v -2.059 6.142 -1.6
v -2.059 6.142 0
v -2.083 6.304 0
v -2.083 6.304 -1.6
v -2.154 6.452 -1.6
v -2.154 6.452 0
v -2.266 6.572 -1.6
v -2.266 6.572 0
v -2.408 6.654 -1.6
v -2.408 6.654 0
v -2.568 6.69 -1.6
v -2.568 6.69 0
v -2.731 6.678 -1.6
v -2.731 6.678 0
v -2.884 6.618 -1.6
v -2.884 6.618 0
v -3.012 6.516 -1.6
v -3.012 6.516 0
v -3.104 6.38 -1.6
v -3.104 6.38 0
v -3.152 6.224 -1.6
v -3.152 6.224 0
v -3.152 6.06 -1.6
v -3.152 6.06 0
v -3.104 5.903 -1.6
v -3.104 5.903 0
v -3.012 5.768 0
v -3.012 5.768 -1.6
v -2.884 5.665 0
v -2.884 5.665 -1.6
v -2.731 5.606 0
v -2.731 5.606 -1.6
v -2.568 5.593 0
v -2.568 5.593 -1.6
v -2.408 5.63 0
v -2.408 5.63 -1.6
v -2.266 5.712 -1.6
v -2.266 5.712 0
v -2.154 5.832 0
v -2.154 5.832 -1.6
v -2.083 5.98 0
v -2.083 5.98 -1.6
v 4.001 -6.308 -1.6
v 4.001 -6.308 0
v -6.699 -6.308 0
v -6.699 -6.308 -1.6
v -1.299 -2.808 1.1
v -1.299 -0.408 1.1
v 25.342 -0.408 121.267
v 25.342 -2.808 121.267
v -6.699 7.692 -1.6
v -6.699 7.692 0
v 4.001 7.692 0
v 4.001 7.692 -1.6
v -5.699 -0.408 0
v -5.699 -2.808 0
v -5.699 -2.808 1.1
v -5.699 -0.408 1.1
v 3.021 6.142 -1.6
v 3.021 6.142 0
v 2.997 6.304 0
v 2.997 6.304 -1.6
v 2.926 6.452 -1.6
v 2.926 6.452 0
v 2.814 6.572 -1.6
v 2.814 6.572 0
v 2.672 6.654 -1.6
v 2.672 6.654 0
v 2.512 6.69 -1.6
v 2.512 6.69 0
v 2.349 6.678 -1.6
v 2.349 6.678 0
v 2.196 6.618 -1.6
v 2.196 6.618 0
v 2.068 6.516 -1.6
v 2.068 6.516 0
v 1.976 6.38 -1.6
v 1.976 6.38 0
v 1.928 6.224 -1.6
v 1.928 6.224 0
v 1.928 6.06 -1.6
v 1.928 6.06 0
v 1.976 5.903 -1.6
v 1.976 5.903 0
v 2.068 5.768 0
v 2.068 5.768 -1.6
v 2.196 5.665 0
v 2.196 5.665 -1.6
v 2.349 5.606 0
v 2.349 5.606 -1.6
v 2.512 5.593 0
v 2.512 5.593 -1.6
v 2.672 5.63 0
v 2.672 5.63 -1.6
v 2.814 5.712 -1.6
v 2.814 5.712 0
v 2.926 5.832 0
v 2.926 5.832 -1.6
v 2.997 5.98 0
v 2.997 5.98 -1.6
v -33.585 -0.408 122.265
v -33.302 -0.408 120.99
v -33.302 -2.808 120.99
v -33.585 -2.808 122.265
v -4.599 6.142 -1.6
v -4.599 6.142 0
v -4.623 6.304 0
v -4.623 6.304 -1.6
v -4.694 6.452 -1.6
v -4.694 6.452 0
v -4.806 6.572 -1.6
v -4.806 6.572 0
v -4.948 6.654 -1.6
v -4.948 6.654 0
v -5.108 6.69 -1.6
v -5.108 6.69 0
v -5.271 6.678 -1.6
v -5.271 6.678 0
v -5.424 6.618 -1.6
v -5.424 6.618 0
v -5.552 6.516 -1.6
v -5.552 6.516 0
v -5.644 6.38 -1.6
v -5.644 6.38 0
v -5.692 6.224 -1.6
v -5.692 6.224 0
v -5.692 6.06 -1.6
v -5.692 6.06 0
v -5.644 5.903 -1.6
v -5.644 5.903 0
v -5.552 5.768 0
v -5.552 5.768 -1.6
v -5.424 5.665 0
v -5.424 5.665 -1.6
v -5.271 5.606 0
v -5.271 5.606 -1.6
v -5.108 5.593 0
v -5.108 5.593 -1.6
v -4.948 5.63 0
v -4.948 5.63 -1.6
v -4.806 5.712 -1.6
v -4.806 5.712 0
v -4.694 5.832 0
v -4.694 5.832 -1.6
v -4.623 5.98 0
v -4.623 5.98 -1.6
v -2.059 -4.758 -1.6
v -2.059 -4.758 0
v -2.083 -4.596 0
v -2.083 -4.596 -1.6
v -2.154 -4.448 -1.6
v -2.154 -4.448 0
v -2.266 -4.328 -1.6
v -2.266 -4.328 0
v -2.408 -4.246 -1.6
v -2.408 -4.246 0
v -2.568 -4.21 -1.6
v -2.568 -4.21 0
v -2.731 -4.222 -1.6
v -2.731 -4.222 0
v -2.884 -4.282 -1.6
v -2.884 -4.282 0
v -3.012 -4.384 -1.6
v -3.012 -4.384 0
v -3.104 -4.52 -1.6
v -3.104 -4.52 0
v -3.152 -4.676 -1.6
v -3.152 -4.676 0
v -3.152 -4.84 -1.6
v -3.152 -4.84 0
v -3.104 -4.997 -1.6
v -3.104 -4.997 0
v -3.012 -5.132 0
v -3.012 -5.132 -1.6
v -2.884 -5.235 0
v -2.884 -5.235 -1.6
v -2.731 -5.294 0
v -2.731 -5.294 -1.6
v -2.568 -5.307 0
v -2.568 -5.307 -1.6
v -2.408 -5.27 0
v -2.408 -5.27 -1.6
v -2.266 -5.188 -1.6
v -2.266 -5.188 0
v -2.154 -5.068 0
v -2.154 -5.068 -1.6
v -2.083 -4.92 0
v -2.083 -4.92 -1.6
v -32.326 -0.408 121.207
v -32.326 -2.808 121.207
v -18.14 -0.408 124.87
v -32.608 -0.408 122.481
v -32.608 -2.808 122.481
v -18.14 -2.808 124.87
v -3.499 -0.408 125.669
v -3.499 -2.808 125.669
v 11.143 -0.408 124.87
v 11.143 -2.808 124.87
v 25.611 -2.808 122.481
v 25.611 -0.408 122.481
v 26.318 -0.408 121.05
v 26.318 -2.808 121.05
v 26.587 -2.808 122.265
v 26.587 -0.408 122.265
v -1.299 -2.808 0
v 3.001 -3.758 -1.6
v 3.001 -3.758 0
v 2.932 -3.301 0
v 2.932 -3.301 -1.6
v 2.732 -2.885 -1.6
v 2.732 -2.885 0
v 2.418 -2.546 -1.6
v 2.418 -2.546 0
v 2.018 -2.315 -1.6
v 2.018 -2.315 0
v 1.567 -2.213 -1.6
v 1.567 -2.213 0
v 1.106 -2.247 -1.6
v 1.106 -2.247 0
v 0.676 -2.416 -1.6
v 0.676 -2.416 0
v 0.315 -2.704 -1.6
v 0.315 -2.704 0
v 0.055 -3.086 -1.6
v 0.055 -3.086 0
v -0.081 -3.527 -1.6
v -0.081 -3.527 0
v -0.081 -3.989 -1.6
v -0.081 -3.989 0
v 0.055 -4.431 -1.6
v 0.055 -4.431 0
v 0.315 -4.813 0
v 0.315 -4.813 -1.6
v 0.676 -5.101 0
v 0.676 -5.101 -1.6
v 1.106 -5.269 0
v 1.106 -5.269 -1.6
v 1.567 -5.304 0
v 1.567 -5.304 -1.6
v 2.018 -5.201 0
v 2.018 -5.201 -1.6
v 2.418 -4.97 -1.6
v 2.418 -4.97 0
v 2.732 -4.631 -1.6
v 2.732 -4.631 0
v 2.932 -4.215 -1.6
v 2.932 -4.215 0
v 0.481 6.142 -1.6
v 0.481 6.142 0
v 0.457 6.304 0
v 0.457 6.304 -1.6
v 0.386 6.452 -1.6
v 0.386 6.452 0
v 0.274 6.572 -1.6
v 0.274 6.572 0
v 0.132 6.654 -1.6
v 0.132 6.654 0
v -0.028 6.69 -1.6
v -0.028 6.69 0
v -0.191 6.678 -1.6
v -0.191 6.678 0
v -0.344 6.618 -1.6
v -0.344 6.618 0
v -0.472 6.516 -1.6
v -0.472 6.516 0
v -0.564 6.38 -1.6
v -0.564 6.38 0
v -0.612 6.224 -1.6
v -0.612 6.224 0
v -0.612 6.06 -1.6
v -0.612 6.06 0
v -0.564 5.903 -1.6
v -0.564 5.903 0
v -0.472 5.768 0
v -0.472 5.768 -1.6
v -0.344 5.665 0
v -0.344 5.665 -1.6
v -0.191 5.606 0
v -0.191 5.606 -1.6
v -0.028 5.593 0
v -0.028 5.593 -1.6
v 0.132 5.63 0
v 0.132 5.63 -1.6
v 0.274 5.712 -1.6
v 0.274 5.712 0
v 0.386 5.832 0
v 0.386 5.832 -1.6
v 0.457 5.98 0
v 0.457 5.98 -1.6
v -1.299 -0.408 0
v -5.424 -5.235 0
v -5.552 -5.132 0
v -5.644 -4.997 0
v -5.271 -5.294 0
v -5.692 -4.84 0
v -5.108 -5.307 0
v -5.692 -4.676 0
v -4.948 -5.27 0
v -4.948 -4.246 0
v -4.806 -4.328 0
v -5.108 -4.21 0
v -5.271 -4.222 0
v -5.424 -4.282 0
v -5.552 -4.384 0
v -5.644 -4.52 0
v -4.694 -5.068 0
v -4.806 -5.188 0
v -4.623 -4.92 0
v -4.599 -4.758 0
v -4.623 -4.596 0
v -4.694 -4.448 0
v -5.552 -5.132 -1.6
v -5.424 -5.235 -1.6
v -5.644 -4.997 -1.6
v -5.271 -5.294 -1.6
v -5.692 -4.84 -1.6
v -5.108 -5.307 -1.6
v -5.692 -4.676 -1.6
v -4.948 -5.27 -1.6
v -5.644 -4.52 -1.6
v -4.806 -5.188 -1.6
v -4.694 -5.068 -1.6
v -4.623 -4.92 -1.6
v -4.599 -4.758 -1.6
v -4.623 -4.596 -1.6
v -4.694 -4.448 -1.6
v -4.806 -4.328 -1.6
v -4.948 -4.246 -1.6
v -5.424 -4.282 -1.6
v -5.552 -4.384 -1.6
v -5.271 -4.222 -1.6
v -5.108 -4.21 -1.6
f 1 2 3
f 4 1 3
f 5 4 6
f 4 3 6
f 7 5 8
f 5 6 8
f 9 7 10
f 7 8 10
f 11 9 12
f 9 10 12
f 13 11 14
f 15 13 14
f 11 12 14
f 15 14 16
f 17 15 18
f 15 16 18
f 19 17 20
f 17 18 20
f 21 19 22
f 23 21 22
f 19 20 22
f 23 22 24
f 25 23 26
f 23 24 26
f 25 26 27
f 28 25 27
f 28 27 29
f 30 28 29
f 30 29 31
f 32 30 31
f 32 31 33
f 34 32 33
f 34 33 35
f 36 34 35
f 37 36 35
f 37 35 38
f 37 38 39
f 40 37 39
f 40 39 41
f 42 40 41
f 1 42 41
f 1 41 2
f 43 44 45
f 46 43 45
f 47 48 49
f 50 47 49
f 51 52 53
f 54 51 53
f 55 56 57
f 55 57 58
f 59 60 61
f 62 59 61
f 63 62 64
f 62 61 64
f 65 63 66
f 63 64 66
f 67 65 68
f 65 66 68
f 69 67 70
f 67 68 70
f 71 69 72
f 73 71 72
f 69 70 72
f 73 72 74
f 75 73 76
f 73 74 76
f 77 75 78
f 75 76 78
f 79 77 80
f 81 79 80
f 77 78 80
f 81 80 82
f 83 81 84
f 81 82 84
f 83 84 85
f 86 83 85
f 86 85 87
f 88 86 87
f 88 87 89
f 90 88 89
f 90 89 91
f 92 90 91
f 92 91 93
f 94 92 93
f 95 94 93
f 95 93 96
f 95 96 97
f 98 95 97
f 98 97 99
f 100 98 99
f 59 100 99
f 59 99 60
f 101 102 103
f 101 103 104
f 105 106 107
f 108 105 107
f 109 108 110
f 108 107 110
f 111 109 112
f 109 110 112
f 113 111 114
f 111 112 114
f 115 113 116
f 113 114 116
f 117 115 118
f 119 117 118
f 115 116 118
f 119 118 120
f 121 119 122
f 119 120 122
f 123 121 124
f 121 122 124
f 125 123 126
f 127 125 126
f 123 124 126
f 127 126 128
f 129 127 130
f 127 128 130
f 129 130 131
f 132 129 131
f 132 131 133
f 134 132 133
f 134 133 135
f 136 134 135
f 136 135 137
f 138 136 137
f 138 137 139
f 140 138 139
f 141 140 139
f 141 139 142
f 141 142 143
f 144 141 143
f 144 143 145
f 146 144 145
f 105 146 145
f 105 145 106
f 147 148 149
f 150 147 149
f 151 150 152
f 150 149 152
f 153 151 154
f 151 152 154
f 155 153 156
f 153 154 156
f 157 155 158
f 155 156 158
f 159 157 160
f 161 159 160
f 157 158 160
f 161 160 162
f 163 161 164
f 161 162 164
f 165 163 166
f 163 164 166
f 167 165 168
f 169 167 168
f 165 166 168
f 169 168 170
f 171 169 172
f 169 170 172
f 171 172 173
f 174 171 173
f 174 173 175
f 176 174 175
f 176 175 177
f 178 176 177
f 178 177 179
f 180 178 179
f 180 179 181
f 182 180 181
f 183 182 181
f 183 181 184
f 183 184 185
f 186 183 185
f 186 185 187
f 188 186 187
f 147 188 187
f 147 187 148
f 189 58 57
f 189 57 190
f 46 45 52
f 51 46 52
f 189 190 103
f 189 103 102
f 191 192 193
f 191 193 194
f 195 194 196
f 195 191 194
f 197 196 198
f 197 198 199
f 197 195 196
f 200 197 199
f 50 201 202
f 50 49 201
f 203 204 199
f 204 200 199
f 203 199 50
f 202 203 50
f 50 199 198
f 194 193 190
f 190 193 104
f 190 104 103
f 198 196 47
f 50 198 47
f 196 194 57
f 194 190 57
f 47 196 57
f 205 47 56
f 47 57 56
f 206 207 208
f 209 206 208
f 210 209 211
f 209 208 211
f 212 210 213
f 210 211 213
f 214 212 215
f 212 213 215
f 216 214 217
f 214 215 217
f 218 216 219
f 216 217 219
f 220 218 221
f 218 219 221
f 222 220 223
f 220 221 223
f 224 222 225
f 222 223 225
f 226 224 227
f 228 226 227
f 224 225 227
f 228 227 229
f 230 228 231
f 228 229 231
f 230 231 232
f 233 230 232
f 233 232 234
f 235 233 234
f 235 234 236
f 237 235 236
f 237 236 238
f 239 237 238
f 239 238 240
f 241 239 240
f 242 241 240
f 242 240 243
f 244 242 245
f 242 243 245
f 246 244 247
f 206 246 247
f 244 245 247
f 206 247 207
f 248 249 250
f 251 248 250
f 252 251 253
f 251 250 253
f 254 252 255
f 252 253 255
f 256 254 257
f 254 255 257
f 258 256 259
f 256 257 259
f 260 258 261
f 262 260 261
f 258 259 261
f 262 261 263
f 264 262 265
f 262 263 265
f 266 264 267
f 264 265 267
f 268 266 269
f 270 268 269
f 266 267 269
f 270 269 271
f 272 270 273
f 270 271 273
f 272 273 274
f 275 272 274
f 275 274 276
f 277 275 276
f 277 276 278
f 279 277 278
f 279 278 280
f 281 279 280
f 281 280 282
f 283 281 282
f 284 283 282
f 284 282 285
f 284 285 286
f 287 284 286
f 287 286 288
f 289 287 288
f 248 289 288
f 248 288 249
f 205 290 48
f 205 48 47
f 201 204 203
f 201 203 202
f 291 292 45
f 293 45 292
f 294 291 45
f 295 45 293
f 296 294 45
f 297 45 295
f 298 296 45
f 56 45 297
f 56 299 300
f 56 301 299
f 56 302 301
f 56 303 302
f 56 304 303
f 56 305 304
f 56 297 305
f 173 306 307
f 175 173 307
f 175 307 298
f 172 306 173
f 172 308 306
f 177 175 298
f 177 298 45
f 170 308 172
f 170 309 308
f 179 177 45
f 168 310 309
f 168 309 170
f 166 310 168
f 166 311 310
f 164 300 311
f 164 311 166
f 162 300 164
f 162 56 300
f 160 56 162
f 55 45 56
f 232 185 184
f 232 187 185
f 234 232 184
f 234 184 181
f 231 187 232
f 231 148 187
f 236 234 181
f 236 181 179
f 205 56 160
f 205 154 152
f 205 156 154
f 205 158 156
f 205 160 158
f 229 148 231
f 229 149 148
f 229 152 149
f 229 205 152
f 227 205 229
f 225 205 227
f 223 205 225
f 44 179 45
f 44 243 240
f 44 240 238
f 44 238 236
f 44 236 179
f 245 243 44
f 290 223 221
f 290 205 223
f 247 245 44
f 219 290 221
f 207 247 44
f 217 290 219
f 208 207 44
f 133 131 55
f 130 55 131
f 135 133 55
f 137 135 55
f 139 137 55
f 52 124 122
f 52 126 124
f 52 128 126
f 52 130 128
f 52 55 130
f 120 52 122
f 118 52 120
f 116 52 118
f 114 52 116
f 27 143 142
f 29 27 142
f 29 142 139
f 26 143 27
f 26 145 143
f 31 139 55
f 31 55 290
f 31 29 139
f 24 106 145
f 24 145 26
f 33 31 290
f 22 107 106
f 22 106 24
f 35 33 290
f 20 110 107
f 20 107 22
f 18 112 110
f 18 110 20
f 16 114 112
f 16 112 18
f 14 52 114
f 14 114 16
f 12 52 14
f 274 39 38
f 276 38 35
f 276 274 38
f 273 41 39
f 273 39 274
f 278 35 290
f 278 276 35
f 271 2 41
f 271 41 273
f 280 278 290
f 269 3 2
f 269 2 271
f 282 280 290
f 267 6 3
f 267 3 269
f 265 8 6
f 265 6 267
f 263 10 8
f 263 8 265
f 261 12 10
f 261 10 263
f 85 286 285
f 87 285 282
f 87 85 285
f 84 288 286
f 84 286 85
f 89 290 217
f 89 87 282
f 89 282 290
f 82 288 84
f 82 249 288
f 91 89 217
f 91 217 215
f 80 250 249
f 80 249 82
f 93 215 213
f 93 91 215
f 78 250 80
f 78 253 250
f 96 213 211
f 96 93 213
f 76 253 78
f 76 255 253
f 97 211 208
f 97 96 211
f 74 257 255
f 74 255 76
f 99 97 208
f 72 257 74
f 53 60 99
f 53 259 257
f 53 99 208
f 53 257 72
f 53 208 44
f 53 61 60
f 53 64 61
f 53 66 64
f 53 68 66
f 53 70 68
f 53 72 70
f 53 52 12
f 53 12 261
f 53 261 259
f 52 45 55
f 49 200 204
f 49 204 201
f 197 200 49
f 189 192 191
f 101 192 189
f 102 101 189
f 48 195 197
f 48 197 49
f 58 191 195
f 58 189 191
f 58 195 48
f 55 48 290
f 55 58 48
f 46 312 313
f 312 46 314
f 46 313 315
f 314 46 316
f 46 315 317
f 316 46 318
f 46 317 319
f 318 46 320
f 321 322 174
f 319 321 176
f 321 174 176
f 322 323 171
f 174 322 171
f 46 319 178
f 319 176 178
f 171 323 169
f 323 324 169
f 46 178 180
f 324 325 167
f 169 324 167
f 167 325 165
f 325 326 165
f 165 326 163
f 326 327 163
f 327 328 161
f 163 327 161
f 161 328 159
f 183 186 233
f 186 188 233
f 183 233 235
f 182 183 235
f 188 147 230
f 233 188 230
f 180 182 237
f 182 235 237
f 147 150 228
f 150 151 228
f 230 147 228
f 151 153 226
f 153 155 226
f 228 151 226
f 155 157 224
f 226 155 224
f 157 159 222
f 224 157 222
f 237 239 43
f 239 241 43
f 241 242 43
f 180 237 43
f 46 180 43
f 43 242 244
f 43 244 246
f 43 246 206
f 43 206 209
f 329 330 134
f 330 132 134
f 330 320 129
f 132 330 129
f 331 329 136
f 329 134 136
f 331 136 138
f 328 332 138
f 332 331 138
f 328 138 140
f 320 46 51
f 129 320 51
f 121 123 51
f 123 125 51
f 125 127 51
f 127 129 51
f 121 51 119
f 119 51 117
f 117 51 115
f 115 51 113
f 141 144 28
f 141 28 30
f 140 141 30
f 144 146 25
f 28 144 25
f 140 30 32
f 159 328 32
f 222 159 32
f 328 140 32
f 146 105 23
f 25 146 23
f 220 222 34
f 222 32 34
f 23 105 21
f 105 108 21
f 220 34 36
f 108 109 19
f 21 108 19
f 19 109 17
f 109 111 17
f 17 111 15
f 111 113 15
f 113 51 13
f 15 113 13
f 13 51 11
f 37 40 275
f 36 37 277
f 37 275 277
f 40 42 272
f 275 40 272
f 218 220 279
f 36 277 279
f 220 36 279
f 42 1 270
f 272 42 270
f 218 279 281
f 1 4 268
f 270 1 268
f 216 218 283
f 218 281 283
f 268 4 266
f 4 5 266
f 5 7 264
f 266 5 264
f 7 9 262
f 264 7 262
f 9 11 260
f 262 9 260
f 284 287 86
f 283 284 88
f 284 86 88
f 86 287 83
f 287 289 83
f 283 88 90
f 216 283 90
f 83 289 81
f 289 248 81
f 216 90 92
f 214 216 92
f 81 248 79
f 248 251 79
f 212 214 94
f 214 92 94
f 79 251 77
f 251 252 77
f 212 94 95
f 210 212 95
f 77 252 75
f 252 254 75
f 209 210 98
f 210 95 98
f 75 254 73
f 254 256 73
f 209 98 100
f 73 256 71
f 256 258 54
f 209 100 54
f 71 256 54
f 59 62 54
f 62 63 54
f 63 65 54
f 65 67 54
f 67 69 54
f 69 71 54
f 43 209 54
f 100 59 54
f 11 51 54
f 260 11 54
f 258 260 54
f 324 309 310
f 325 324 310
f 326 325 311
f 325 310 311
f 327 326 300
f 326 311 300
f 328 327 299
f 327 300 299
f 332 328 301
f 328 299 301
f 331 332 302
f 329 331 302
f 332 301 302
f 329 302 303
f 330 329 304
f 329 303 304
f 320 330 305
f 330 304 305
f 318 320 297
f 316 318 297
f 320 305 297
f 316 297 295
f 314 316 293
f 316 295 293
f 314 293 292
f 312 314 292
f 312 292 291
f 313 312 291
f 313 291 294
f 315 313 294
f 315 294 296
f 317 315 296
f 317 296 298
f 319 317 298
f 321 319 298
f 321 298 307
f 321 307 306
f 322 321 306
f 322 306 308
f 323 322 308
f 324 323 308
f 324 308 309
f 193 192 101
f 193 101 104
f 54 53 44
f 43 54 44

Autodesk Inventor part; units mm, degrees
ref_plane "YZ Plane" through (0, 0, 0) normal (1, 0, 0) x (0, 1, 0)
ref_plane "XZ Plane" through (0, 0, 0) normal (0, 1, 0) x (-1, 0, 0)
ref_plane "XY Plane" through (0, 0, 0) normal (0, 0, 1) x (1, 0, 0)
sketch "Sketch1" plane through (0, 0, 0) normal (0, 0, 1) x (1, 0, 0)
  line L0 (-6.698639, 7.691729) -> (4.001361, 7.691729)
  line L1 (4.001361, 7.691729) -> (4.001361, -6.308271)
  line L2 (4.001361, -6.308271) -> (-6.698639, -6.308271)
  line L3 (-6.698639, -6.308271) -> (-6.698639, 7.691729)
  line L4 (4.001361, -6.308271) -> (-6.698639, -6.308271)
  line L5 (-6.698639, -6.308271) -> (-6.698639, -2.808271)
  line L6 (-6.698639, -2.808271) -> (4.001361, -2.808271)
  line L7 (4.001361, -2.808271) -> (4.001361, -6.308271)
  line L8 (-6.698639, -6.308271) -> (-5.698639, -6.308271)
  line L9 (-5.698639, -6.308271) -> (-5.698639, 7.691729)
  line L10 (-5.698639, 7.691729) -> (-6.698639, 7.691729)
  line L11 (-6.698639, 7.691729) -> (-6.698639, -6.308271)
  line L12 (-5.698639, -2.808271) -> (3.472299, -2.808271)
  line L13 (3.472299, -2.808271) -> (3.472299, -0.408271)
  line L14 (3.472299, -0.408271) -> (-5.698639, -0.408271)
  line L15 (-5.698639, -0.408271) -> (-5.698639, -2.808271)
  line L16 (-5.698639, -0.408271) -> (-1.298639, -0.408271)
  line L17 (-1.298639, -0.408271) -> (-1.298639, -2.808271)
  line L18 (-1.298639, -2.808271) -> (-5.698639, -2.808271)
  line L19 (-5.698639, -2.808271) -> (-5.698639, -0.408271)
  point P0 (0, 0)
  dimension "d0" = 10.7
  dimension "d1" = 14
  dimension "d2" = 3.5
  dimension "d3" = 1
  dimension "d4" = 2.4
  dimension "d5" = 4.4
extrude "Extrusion1" add sketch "Sketch1" against normal blind 1.6
extrude "Extrusion2" add sketch "Sketch1" along normal blind 1.1 contours L14 L17 L6 L9
sketch "Sketch2" plane through (0, 0, 0) normal (0, 0, 1) x (1, 0, 0)
  line L0 (-1.298639, -0.408271) -> (-1.298639, -2.808271)
  line L1 (-1.298639, -2.808271) -> (-5.698639, -2.808271)
  line L2 (-5.698639, -2.808271) -> (-5.698639, -0.408271)
  line L3 (-5.698639, -0.408271) -> (-1.298639, -0.408271)
  line L4 (4.001361, 7.691729) -> (-6.698639, 7.691729)
  line L5 (-6.698639, 7.691729) -> (-6.698639, -6.308271)
  line L6 (-6.698639, -6.308271) -> (4.001361, -6.308271)
  line L7 (4.001361, -6.308271) -> (4.001361, 7.691729)
  line L8 (4.001361, -6.308271) -> (4.001361, 7.691729)
  line L9 (-6.698639, 7.691729) -> (-6.698639, -6.308271)
  line L10 (4.001361, -6.308271) -> (-6.698639, -6.308271)
  line L11 (-6.698639, -6.308271) -> (-6.698639, -5.308271)
  line L12 (-6.698639, -5.308271) -> (4.001361, -5.308271)
  line L13 (4.001361, -5.308271) -> (4.001361, -6.308271)
  line L14 (4.001361, -6.308271) -> (3.001361, -6.308271)
  line L15 (3.001361, -6.308271) -> (3.001361, -2.808271)
  line L16 (3.001361, -2.808271) -> (4.001361, -2.808271)
  line L17 (4.001361, -2.808271) -> (4.001361, -6.308271)
  line L18 (-6.698639, -6.308271) -> (-0.098639, -6.308271)
  line L19 (-0.098639, -6.308271) -> (-0.098639, -2.808271)
  line L20 (-0.098639, -2.808271) -> (-6.698639, -2.808271)
  line L21 (-6.698639, -2.808271) -> (-6.698639, -6.308271)
  circle A0 centre (1.451361, -3.758271) radius 1.55
  point P0 (0, 0)
  dimension "d10" = 1
  dimension "d11" = 1
  dimension "d12" = 6.6
extrude "Extrusion3" cut sketch "Sketch2" against normal through all contours A0
sketch "Sketch3" plane through (0, 0, 0) normal (0, 0, 1) x (1, 0, 0)
  line L0 (4.001361, 7.691729) -> (4.001361, -6.308271)
  line L1 (-6.698639, 7.691729) -> (4.001361, 7.691729)
  line L2 (4.001361, 7.691729) -> (4.001361, 6.691729)
  line L3 (4.001361, 6.691729) -> (-6.698639, 6.691729)
  line L4 (-6.698639, 6.691729) -> (-6.698639, 7.691729)
  line L5 (-6.698639, 7.691729) -> (-5.698639, 7.691729)
  line L6 (-5.698639, 7.691729) -> (-5.698639, 5.612457)
  line L7 (-5.698639, 5.612457) -> (-6.698639, 5.612457)
  line L8 (-6.698639, 5.612457) -> (-6.698639, 7.691729)
  line L9 (-5.698639, 6.691729) -> (-4.598639, 6.691729)
  line L10 (-4.598639, 6.691729) -> (-4.598639, 6.161753)
  line L11 (-4.598639, 6.161753) -> (-5.698639, 6.161753)
  line L12 (-5.698639, 6.161753) -> (-5.698639, 6.691729)
  circle A0 centre (-5.148639, 6.141729) radius 0.55
  circle A1 centre (-2.608639, 6.141729) radius 0.55
  line L13 (-2.058639, 6.161753) -> (-3.158639, 6.161753)
  circle A2 centre (-0.068639, 6.141729) radius 0.55
  line L14 (0.481361, 6.161753) -> (-0.618639, 6.161753)
  circle A3 centre (2.471361, 6.141729) radius 0.55
  line L15 (3.021361, 6.161753) -> (1.921361, 6.161753)
  circle A4 centre (1.451361, -3.758271) radius 1.55
  line L16 (-1.298639, -0.408271) -> (-1.298639, -2.808271)
  line L17 (-1.298639, -2.808271) -> (-5.698639, -2.808271)
  line L18 (-5.698639, -2.808271) -> (-5.698639, -0.408271)
  line L19 (-5.698639, -0.408271) -> (-1.298639, -0.408271)
  line L20 (4.001361, 7.691729) -> (-6.698639, 7.691729)
  line L21 (-6.698639, 7.691729) -> (-6.698639, -6.308271)
  line L22 (-6.698639, -6.308271) -> (4.001361, -6.308271)
  line L23 (4.001361, -6.308271) -> (4.001361, 7.691729)
  line L24 (-6.698639, -6.308271) -> (-5.698639, -6.308271)
  line L25 (-5.698639, -6.308271) -> (-5.698639, -3.371834)
  line L26 (-5.698639, -3.371834) -> (-6.698639, -3.371834)
  line L27 (-6.698639, -3.371834) -> (-6.698639, -6.308271)
  line L28 (-6.698639, -6.308271) -> (4.001361, -6.308271)
  line L29 (-6.698639, -6.308271) -> (-3.498639, -6.308271)
  line L30 (-3.498639, -6.308271) -> (-3.498639, -5.308271)
  line L31 (-3.498639, -5.308271) -> (-6.698639, -5.308271)
  line L32 (-6.698639, -5.308271) -> (-6.698639, -6.308271)
  line L33 (-5.698639, -6.308271) -> (-4.598639, -6.308271)
  line L34 (-4.598639, -6.308271) -> (-4.598639, -3.371834)
  line L35 (-4.598639, -3.371834) -> (-5.698639, -3.371834)
  line L36 (-5.698639, -3.371834) -> (-5.698639, -6.308271)
  circle A5 centre (-5.148639, -4.758271) radius 0.55
  circle A6 centre (-2.608639, -4.758271) radius 0.55
  line L37 (-0.958639, -5.308271) -> (-4.158639, -5.308271)
  point P0 (0, 0)
  dimension "d15" = 1
  dimension "d16" = 1
  dimension "d17" = 1.1
  dimension "d20" = 2.54
  dimension "d25" = 1
  dimension "d26" = 1
  dimension "d27" = 1.1
  dimension "d30" = 2.54
sketch "Sketch3 outline for Extrusion4" plane through (0, 0, 0) normal (0, 0, 1) x (1, 0, 0)
  circle A0 centre (-5.148639, -4.758271) radius 0.55
  circle A1 centre (-2.608639, -4.758271) radius 0.55
  circle A2 centre (2.471361, 6.141729) radius 0.55
  circle A3 centre (-0.068639, 6.141729) radius 0.55
  circle A4 centre (-2.608639, 6.141729) radius 0.55
  circle A5 centre (-5.148639, 6.141729) radius 0.55
extrude "Extrusion4" cut sketch "Sketch3 outline for Extrusion4" against normal through all
sketch "Sketch4" plane through (-5.698639, -0.408271, 0) normal (0, 1, 0) x (1, 0, 0)
  line L0 (0, 0) -> (4.4, 0)
  line L1 (0, 0) -> (0, -1.1)
  line L2 (4.4, -1.1) -> (0, -1.1)
  line L3 (4.4, 0) -> (4.4, -1.1)
  line L4 (0, -1.1) -> (4.4, -1.1)
  line L5 (2.2, -1.1) -> (2.2, 3.167795)
  line L6 (0, -1.1) -> (-26.909589, -122.481313)
  line L7 (0, -1.1) -> (4.299042, 18.291726)
  line L8 (4.4, -1.1) -> (31.309589, -122.481313)
  line L9 (4.4, -1.1) -> (0.100958, 18.291726)
  circle A0 centre (2.2, 8.823559) radius 134.49289
  point P0 (5.698639, 0)
  dimension "d37" = 12.5
extrude "Extrusion5" add sketch "Sketch4" against normal up to surface (2.4 mm away) contours L2 L8 A0 L6
sketch "Sketch5" plane through (-5.698639, -0.408271, 1.1) normal (-0.976296, 0, -0.2164396) x (-0.2164396, 0, 0.976296)
  line L0 (0, -2.4) -> (124.328392, -2.4)
  line L1 (124.328392, 0) -> (124.328392, -2.4)
  line L2 (0, 0) -> (124.328392, 0)
  line L3 (0, 0) -> (0, -2.4)
  line L4 (124.328392, 0) -> (124.328392, -2.4)
  line L5 (124.328392, 0) -> (111.727456, 0)
  line L6 (124.328392, -2.4) -> (123.022867, -2.4)
  line L7 (123.022867, -2.4) -> (123.022867, 0)
  line L8 (123.022867, 0) -> (124.328392, 0)
  line L9 (124.328392, 0) -> (124.328392, -2.4)
  point P0 (-2.307337, 0.408271)
  point P1 (123.022867, 0)
  point P2 (123.022867, -2.4)
extrude "Extrusion6" add sketch "Sketch5" along normal blind 1 contours L7 L2 L1 L0
sketch "Sketch6" plane through (25.610951, -0.408271, 122.481313) normal (0.976296, 0, -0.2164396) x (-0.2164396, 0, -0.976296)
  line L0 (0, -2.4) -> (124.328392, -2.4)
  line L1 (124.328392, -2.4) -> (124.328392, 0)
  line L2 (0, 0) -> (124.328392, 0)
  line L3 (0, 0) -> (0, -2.4)
  line L4 (0, 0) -> (0, -2.4)
  line L5 (0, -2.4) -> (124.328392, -2.4)
  line L6 (0, 0) -> (1.244112, 0)
  line L7 (1.244112, 0) -> (1.244112, -2.4)
  line L8 (1.244112, -2.4) -> (0, -2.4)
  line L9 (0, -2.4) -> (0, 0)
  point P0 (125.121241, 0.408271)
  point P1 (1.244112, -2.4)
  point P2 (1.244112, 0)
extrude "Extrusion7" add sketch "Sketch6" along normal blind 1 contours L3 L2 L7 L0
properties part number "TOF_VLCOS"
